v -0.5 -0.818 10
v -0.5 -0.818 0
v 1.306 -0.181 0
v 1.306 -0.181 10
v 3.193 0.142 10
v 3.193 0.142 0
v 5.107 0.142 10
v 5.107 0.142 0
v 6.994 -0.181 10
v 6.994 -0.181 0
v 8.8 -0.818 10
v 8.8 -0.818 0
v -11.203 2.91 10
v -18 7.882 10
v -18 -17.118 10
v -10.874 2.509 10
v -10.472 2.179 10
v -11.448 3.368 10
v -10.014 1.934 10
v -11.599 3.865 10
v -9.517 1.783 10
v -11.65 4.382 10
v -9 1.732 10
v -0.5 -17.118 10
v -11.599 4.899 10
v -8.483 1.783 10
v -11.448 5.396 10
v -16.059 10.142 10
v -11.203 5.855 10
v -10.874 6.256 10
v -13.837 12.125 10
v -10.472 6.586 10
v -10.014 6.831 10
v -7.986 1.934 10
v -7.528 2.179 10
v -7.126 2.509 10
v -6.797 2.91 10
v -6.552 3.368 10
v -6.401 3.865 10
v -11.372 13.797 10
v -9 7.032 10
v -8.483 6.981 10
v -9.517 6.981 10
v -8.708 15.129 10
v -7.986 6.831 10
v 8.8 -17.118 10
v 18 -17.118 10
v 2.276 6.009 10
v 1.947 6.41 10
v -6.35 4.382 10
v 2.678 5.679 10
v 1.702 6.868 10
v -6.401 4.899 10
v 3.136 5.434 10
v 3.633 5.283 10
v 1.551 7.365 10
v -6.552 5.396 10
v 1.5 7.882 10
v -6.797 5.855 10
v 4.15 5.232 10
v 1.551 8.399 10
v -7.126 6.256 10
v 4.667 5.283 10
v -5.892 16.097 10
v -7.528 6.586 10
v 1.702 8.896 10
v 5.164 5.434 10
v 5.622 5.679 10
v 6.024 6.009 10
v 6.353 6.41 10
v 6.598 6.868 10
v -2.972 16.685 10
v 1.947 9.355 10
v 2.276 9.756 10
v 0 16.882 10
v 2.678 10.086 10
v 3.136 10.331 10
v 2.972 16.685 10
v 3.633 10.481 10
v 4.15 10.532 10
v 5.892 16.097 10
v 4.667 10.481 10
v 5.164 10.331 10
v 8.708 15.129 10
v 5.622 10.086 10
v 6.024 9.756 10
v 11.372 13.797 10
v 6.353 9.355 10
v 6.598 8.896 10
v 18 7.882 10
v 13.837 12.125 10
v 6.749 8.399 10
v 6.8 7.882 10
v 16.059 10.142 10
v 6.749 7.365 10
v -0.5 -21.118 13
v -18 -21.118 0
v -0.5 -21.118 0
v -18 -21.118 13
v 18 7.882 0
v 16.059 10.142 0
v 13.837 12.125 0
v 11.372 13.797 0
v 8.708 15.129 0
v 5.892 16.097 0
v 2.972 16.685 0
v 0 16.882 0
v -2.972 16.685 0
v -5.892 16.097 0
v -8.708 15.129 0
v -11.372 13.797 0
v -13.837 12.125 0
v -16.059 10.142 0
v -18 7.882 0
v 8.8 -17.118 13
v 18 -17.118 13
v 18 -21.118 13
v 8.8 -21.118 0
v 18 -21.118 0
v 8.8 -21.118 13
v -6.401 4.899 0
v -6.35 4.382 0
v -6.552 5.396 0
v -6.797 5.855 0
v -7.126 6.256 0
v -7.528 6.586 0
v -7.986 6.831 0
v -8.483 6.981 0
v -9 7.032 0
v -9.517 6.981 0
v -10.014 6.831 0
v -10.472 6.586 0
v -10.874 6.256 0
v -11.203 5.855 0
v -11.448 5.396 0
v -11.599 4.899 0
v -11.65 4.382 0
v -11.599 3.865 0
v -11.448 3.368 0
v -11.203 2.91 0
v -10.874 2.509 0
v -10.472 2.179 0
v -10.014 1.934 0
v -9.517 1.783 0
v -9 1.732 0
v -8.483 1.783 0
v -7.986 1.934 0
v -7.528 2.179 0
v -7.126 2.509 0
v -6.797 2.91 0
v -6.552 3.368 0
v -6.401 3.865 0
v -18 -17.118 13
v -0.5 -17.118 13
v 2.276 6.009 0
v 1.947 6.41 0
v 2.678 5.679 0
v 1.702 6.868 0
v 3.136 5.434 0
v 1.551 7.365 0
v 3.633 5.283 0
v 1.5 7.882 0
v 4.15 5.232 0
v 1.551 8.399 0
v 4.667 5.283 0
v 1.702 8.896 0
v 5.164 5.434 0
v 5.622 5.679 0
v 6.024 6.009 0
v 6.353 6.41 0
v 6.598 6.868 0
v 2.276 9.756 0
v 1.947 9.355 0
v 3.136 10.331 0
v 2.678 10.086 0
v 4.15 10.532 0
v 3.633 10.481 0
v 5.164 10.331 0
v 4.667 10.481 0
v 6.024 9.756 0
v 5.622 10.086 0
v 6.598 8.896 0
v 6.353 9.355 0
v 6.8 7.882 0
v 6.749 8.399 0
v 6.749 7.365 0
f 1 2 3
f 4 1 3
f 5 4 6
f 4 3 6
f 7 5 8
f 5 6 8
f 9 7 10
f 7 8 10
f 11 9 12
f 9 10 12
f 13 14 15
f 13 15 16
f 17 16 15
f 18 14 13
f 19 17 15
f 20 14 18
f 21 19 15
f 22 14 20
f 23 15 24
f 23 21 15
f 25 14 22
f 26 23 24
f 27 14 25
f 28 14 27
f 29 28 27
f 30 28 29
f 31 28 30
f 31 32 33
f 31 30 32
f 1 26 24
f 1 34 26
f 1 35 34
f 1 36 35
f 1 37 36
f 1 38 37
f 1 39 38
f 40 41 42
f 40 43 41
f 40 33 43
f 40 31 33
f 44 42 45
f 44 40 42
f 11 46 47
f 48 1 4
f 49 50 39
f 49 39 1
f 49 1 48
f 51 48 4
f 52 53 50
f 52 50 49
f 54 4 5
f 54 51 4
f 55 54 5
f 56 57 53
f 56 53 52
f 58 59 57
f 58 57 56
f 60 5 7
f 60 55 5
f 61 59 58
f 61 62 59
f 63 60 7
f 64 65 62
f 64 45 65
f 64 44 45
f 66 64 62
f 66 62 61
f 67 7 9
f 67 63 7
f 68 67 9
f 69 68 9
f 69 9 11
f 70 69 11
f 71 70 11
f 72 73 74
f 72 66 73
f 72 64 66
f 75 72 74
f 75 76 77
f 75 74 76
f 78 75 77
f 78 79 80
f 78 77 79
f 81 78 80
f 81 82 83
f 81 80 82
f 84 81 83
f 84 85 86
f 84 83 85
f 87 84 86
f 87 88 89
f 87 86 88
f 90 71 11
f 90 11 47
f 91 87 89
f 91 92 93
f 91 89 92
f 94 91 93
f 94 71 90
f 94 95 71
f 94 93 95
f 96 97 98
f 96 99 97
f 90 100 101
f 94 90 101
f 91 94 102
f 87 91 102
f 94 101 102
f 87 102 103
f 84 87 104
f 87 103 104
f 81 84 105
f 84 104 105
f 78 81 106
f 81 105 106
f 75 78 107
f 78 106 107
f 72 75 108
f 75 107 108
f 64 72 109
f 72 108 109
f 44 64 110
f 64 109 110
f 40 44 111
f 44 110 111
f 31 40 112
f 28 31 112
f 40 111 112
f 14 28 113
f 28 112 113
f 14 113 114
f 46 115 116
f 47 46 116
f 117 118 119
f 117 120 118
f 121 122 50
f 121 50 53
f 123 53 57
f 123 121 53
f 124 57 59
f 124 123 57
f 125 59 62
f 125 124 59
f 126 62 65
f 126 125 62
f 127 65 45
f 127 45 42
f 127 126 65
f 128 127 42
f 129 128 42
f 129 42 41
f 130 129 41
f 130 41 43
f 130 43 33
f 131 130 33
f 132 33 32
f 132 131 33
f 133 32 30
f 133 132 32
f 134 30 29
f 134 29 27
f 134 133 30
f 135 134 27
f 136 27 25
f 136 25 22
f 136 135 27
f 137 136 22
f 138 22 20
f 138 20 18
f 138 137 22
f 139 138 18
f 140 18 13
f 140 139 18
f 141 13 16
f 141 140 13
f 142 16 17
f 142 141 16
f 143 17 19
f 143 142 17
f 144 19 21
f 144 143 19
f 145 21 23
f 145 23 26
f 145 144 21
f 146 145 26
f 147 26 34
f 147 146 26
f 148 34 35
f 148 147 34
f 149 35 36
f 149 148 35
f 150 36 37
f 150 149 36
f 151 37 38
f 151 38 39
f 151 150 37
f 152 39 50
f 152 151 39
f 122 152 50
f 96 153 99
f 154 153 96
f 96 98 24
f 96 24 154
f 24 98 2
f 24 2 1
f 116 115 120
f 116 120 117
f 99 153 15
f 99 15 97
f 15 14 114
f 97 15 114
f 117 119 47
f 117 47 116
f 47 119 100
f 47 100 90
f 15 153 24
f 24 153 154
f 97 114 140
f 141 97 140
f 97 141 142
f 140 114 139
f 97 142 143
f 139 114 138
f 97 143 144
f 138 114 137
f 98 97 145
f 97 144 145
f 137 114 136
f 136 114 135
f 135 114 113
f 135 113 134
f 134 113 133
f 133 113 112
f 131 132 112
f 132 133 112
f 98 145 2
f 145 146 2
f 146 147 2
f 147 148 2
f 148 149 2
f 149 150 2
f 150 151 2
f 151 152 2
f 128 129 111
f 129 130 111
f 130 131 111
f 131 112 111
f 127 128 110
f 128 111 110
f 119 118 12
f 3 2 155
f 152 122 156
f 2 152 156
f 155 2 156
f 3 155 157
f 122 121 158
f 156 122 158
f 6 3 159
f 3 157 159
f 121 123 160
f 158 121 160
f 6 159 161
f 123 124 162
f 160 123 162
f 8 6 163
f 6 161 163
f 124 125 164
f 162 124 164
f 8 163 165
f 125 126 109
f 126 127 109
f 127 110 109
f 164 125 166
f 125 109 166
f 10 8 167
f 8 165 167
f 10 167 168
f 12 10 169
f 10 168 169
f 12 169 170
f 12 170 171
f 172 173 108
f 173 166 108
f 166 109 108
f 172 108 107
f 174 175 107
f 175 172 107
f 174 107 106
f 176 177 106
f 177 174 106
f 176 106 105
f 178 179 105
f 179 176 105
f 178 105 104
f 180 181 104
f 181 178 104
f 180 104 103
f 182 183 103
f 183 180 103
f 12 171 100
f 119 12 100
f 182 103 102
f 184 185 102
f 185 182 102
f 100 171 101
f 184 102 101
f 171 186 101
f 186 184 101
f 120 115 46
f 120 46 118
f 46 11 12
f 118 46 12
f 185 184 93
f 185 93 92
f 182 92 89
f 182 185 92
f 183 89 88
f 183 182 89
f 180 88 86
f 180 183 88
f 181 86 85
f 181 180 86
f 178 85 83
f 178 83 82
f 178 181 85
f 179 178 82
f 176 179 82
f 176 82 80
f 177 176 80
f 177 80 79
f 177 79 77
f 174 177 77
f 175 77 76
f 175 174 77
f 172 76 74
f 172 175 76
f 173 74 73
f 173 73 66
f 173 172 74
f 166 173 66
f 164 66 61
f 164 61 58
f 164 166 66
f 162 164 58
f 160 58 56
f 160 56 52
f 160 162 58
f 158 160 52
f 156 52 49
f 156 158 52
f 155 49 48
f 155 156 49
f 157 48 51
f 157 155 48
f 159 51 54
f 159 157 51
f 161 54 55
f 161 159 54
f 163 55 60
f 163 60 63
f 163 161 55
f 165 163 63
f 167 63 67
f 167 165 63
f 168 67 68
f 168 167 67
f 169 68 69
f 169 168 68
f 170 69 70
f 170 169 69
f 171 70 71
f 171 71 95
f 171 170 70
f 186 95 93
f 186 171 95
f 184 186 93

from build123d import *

# Parameters (mm, degrees)
F0_R     = 2.65
F1_DEPTH = 10
F2_W     = 9.2
F2_H     = 10
F2_H_2   = 3
F3_DEPTH = 4
F4_W     = 17.5
F4_H     = 10
F4_H_2   = 3
F5_DEPTH = 4


with BuildPart() as f1:
    # F0 (on Top) → F1 (new body)
    with BuildSketch(Plane.XY):
        with BuildLine():
            Line((-18, 7.8823786229), (-18, -17.1176213771))
            Line((-18, -17.1176213771), (-0.5, -17.1176213771))
            Line((-0.5, -17.1176213771), (-0.5, -0.8176213771))
            ThreePointArc((-0.5, -0.8176213771), (4.15, 0.1823786229), (8.8, -0.8176213771))
            Line((8.8, -0.8176213771), (8.8, -17.1176213771))
            Line((8.8, -17.1176213771), (18, -17.1176213771))
            Line((18, -17.1176213771), (18, 7.8823786229))
            ThreePointArc((18, 7.8823786229), (0, 16.8823786229), (-18, 7.8823786229))
        make_face()
        with Locations((-9, 4.3823786229)):
            Circle(F0_R, mode=Mode.SUBTRACT)
        with Locations((4.15, 7.8823786229)):
            Circle(F0_R, mode=Mode.SUBTRACT)
    extrude(amount=F1_DEPTH)

    # F2 (on face) → F3 (join)
    with BuildSketch(Plane.XZ.offset(17.1176213771)):
        with Locations((13.4, 5)):
            Rectangle(F2_W, F2_H)
        with Locations((13.4, 11.5)):
            Rectangle(F2_W, F2_H_2)
    extrude(amount=F3_DEPTH)

    # F4 (on face) → F5 (join, through all)
    with BuildSketch(Plane.XZ.offset(17.1176213771)):
        with Locations((-9.25, 5)):
            Rectangle(F4_W, F4_H)
        with Locations((-9.25, 11.5)):
            Rectangle(F4_W, F4_H_2)
    extrude(amount=F5_DEPTH)


solid = f1.part
